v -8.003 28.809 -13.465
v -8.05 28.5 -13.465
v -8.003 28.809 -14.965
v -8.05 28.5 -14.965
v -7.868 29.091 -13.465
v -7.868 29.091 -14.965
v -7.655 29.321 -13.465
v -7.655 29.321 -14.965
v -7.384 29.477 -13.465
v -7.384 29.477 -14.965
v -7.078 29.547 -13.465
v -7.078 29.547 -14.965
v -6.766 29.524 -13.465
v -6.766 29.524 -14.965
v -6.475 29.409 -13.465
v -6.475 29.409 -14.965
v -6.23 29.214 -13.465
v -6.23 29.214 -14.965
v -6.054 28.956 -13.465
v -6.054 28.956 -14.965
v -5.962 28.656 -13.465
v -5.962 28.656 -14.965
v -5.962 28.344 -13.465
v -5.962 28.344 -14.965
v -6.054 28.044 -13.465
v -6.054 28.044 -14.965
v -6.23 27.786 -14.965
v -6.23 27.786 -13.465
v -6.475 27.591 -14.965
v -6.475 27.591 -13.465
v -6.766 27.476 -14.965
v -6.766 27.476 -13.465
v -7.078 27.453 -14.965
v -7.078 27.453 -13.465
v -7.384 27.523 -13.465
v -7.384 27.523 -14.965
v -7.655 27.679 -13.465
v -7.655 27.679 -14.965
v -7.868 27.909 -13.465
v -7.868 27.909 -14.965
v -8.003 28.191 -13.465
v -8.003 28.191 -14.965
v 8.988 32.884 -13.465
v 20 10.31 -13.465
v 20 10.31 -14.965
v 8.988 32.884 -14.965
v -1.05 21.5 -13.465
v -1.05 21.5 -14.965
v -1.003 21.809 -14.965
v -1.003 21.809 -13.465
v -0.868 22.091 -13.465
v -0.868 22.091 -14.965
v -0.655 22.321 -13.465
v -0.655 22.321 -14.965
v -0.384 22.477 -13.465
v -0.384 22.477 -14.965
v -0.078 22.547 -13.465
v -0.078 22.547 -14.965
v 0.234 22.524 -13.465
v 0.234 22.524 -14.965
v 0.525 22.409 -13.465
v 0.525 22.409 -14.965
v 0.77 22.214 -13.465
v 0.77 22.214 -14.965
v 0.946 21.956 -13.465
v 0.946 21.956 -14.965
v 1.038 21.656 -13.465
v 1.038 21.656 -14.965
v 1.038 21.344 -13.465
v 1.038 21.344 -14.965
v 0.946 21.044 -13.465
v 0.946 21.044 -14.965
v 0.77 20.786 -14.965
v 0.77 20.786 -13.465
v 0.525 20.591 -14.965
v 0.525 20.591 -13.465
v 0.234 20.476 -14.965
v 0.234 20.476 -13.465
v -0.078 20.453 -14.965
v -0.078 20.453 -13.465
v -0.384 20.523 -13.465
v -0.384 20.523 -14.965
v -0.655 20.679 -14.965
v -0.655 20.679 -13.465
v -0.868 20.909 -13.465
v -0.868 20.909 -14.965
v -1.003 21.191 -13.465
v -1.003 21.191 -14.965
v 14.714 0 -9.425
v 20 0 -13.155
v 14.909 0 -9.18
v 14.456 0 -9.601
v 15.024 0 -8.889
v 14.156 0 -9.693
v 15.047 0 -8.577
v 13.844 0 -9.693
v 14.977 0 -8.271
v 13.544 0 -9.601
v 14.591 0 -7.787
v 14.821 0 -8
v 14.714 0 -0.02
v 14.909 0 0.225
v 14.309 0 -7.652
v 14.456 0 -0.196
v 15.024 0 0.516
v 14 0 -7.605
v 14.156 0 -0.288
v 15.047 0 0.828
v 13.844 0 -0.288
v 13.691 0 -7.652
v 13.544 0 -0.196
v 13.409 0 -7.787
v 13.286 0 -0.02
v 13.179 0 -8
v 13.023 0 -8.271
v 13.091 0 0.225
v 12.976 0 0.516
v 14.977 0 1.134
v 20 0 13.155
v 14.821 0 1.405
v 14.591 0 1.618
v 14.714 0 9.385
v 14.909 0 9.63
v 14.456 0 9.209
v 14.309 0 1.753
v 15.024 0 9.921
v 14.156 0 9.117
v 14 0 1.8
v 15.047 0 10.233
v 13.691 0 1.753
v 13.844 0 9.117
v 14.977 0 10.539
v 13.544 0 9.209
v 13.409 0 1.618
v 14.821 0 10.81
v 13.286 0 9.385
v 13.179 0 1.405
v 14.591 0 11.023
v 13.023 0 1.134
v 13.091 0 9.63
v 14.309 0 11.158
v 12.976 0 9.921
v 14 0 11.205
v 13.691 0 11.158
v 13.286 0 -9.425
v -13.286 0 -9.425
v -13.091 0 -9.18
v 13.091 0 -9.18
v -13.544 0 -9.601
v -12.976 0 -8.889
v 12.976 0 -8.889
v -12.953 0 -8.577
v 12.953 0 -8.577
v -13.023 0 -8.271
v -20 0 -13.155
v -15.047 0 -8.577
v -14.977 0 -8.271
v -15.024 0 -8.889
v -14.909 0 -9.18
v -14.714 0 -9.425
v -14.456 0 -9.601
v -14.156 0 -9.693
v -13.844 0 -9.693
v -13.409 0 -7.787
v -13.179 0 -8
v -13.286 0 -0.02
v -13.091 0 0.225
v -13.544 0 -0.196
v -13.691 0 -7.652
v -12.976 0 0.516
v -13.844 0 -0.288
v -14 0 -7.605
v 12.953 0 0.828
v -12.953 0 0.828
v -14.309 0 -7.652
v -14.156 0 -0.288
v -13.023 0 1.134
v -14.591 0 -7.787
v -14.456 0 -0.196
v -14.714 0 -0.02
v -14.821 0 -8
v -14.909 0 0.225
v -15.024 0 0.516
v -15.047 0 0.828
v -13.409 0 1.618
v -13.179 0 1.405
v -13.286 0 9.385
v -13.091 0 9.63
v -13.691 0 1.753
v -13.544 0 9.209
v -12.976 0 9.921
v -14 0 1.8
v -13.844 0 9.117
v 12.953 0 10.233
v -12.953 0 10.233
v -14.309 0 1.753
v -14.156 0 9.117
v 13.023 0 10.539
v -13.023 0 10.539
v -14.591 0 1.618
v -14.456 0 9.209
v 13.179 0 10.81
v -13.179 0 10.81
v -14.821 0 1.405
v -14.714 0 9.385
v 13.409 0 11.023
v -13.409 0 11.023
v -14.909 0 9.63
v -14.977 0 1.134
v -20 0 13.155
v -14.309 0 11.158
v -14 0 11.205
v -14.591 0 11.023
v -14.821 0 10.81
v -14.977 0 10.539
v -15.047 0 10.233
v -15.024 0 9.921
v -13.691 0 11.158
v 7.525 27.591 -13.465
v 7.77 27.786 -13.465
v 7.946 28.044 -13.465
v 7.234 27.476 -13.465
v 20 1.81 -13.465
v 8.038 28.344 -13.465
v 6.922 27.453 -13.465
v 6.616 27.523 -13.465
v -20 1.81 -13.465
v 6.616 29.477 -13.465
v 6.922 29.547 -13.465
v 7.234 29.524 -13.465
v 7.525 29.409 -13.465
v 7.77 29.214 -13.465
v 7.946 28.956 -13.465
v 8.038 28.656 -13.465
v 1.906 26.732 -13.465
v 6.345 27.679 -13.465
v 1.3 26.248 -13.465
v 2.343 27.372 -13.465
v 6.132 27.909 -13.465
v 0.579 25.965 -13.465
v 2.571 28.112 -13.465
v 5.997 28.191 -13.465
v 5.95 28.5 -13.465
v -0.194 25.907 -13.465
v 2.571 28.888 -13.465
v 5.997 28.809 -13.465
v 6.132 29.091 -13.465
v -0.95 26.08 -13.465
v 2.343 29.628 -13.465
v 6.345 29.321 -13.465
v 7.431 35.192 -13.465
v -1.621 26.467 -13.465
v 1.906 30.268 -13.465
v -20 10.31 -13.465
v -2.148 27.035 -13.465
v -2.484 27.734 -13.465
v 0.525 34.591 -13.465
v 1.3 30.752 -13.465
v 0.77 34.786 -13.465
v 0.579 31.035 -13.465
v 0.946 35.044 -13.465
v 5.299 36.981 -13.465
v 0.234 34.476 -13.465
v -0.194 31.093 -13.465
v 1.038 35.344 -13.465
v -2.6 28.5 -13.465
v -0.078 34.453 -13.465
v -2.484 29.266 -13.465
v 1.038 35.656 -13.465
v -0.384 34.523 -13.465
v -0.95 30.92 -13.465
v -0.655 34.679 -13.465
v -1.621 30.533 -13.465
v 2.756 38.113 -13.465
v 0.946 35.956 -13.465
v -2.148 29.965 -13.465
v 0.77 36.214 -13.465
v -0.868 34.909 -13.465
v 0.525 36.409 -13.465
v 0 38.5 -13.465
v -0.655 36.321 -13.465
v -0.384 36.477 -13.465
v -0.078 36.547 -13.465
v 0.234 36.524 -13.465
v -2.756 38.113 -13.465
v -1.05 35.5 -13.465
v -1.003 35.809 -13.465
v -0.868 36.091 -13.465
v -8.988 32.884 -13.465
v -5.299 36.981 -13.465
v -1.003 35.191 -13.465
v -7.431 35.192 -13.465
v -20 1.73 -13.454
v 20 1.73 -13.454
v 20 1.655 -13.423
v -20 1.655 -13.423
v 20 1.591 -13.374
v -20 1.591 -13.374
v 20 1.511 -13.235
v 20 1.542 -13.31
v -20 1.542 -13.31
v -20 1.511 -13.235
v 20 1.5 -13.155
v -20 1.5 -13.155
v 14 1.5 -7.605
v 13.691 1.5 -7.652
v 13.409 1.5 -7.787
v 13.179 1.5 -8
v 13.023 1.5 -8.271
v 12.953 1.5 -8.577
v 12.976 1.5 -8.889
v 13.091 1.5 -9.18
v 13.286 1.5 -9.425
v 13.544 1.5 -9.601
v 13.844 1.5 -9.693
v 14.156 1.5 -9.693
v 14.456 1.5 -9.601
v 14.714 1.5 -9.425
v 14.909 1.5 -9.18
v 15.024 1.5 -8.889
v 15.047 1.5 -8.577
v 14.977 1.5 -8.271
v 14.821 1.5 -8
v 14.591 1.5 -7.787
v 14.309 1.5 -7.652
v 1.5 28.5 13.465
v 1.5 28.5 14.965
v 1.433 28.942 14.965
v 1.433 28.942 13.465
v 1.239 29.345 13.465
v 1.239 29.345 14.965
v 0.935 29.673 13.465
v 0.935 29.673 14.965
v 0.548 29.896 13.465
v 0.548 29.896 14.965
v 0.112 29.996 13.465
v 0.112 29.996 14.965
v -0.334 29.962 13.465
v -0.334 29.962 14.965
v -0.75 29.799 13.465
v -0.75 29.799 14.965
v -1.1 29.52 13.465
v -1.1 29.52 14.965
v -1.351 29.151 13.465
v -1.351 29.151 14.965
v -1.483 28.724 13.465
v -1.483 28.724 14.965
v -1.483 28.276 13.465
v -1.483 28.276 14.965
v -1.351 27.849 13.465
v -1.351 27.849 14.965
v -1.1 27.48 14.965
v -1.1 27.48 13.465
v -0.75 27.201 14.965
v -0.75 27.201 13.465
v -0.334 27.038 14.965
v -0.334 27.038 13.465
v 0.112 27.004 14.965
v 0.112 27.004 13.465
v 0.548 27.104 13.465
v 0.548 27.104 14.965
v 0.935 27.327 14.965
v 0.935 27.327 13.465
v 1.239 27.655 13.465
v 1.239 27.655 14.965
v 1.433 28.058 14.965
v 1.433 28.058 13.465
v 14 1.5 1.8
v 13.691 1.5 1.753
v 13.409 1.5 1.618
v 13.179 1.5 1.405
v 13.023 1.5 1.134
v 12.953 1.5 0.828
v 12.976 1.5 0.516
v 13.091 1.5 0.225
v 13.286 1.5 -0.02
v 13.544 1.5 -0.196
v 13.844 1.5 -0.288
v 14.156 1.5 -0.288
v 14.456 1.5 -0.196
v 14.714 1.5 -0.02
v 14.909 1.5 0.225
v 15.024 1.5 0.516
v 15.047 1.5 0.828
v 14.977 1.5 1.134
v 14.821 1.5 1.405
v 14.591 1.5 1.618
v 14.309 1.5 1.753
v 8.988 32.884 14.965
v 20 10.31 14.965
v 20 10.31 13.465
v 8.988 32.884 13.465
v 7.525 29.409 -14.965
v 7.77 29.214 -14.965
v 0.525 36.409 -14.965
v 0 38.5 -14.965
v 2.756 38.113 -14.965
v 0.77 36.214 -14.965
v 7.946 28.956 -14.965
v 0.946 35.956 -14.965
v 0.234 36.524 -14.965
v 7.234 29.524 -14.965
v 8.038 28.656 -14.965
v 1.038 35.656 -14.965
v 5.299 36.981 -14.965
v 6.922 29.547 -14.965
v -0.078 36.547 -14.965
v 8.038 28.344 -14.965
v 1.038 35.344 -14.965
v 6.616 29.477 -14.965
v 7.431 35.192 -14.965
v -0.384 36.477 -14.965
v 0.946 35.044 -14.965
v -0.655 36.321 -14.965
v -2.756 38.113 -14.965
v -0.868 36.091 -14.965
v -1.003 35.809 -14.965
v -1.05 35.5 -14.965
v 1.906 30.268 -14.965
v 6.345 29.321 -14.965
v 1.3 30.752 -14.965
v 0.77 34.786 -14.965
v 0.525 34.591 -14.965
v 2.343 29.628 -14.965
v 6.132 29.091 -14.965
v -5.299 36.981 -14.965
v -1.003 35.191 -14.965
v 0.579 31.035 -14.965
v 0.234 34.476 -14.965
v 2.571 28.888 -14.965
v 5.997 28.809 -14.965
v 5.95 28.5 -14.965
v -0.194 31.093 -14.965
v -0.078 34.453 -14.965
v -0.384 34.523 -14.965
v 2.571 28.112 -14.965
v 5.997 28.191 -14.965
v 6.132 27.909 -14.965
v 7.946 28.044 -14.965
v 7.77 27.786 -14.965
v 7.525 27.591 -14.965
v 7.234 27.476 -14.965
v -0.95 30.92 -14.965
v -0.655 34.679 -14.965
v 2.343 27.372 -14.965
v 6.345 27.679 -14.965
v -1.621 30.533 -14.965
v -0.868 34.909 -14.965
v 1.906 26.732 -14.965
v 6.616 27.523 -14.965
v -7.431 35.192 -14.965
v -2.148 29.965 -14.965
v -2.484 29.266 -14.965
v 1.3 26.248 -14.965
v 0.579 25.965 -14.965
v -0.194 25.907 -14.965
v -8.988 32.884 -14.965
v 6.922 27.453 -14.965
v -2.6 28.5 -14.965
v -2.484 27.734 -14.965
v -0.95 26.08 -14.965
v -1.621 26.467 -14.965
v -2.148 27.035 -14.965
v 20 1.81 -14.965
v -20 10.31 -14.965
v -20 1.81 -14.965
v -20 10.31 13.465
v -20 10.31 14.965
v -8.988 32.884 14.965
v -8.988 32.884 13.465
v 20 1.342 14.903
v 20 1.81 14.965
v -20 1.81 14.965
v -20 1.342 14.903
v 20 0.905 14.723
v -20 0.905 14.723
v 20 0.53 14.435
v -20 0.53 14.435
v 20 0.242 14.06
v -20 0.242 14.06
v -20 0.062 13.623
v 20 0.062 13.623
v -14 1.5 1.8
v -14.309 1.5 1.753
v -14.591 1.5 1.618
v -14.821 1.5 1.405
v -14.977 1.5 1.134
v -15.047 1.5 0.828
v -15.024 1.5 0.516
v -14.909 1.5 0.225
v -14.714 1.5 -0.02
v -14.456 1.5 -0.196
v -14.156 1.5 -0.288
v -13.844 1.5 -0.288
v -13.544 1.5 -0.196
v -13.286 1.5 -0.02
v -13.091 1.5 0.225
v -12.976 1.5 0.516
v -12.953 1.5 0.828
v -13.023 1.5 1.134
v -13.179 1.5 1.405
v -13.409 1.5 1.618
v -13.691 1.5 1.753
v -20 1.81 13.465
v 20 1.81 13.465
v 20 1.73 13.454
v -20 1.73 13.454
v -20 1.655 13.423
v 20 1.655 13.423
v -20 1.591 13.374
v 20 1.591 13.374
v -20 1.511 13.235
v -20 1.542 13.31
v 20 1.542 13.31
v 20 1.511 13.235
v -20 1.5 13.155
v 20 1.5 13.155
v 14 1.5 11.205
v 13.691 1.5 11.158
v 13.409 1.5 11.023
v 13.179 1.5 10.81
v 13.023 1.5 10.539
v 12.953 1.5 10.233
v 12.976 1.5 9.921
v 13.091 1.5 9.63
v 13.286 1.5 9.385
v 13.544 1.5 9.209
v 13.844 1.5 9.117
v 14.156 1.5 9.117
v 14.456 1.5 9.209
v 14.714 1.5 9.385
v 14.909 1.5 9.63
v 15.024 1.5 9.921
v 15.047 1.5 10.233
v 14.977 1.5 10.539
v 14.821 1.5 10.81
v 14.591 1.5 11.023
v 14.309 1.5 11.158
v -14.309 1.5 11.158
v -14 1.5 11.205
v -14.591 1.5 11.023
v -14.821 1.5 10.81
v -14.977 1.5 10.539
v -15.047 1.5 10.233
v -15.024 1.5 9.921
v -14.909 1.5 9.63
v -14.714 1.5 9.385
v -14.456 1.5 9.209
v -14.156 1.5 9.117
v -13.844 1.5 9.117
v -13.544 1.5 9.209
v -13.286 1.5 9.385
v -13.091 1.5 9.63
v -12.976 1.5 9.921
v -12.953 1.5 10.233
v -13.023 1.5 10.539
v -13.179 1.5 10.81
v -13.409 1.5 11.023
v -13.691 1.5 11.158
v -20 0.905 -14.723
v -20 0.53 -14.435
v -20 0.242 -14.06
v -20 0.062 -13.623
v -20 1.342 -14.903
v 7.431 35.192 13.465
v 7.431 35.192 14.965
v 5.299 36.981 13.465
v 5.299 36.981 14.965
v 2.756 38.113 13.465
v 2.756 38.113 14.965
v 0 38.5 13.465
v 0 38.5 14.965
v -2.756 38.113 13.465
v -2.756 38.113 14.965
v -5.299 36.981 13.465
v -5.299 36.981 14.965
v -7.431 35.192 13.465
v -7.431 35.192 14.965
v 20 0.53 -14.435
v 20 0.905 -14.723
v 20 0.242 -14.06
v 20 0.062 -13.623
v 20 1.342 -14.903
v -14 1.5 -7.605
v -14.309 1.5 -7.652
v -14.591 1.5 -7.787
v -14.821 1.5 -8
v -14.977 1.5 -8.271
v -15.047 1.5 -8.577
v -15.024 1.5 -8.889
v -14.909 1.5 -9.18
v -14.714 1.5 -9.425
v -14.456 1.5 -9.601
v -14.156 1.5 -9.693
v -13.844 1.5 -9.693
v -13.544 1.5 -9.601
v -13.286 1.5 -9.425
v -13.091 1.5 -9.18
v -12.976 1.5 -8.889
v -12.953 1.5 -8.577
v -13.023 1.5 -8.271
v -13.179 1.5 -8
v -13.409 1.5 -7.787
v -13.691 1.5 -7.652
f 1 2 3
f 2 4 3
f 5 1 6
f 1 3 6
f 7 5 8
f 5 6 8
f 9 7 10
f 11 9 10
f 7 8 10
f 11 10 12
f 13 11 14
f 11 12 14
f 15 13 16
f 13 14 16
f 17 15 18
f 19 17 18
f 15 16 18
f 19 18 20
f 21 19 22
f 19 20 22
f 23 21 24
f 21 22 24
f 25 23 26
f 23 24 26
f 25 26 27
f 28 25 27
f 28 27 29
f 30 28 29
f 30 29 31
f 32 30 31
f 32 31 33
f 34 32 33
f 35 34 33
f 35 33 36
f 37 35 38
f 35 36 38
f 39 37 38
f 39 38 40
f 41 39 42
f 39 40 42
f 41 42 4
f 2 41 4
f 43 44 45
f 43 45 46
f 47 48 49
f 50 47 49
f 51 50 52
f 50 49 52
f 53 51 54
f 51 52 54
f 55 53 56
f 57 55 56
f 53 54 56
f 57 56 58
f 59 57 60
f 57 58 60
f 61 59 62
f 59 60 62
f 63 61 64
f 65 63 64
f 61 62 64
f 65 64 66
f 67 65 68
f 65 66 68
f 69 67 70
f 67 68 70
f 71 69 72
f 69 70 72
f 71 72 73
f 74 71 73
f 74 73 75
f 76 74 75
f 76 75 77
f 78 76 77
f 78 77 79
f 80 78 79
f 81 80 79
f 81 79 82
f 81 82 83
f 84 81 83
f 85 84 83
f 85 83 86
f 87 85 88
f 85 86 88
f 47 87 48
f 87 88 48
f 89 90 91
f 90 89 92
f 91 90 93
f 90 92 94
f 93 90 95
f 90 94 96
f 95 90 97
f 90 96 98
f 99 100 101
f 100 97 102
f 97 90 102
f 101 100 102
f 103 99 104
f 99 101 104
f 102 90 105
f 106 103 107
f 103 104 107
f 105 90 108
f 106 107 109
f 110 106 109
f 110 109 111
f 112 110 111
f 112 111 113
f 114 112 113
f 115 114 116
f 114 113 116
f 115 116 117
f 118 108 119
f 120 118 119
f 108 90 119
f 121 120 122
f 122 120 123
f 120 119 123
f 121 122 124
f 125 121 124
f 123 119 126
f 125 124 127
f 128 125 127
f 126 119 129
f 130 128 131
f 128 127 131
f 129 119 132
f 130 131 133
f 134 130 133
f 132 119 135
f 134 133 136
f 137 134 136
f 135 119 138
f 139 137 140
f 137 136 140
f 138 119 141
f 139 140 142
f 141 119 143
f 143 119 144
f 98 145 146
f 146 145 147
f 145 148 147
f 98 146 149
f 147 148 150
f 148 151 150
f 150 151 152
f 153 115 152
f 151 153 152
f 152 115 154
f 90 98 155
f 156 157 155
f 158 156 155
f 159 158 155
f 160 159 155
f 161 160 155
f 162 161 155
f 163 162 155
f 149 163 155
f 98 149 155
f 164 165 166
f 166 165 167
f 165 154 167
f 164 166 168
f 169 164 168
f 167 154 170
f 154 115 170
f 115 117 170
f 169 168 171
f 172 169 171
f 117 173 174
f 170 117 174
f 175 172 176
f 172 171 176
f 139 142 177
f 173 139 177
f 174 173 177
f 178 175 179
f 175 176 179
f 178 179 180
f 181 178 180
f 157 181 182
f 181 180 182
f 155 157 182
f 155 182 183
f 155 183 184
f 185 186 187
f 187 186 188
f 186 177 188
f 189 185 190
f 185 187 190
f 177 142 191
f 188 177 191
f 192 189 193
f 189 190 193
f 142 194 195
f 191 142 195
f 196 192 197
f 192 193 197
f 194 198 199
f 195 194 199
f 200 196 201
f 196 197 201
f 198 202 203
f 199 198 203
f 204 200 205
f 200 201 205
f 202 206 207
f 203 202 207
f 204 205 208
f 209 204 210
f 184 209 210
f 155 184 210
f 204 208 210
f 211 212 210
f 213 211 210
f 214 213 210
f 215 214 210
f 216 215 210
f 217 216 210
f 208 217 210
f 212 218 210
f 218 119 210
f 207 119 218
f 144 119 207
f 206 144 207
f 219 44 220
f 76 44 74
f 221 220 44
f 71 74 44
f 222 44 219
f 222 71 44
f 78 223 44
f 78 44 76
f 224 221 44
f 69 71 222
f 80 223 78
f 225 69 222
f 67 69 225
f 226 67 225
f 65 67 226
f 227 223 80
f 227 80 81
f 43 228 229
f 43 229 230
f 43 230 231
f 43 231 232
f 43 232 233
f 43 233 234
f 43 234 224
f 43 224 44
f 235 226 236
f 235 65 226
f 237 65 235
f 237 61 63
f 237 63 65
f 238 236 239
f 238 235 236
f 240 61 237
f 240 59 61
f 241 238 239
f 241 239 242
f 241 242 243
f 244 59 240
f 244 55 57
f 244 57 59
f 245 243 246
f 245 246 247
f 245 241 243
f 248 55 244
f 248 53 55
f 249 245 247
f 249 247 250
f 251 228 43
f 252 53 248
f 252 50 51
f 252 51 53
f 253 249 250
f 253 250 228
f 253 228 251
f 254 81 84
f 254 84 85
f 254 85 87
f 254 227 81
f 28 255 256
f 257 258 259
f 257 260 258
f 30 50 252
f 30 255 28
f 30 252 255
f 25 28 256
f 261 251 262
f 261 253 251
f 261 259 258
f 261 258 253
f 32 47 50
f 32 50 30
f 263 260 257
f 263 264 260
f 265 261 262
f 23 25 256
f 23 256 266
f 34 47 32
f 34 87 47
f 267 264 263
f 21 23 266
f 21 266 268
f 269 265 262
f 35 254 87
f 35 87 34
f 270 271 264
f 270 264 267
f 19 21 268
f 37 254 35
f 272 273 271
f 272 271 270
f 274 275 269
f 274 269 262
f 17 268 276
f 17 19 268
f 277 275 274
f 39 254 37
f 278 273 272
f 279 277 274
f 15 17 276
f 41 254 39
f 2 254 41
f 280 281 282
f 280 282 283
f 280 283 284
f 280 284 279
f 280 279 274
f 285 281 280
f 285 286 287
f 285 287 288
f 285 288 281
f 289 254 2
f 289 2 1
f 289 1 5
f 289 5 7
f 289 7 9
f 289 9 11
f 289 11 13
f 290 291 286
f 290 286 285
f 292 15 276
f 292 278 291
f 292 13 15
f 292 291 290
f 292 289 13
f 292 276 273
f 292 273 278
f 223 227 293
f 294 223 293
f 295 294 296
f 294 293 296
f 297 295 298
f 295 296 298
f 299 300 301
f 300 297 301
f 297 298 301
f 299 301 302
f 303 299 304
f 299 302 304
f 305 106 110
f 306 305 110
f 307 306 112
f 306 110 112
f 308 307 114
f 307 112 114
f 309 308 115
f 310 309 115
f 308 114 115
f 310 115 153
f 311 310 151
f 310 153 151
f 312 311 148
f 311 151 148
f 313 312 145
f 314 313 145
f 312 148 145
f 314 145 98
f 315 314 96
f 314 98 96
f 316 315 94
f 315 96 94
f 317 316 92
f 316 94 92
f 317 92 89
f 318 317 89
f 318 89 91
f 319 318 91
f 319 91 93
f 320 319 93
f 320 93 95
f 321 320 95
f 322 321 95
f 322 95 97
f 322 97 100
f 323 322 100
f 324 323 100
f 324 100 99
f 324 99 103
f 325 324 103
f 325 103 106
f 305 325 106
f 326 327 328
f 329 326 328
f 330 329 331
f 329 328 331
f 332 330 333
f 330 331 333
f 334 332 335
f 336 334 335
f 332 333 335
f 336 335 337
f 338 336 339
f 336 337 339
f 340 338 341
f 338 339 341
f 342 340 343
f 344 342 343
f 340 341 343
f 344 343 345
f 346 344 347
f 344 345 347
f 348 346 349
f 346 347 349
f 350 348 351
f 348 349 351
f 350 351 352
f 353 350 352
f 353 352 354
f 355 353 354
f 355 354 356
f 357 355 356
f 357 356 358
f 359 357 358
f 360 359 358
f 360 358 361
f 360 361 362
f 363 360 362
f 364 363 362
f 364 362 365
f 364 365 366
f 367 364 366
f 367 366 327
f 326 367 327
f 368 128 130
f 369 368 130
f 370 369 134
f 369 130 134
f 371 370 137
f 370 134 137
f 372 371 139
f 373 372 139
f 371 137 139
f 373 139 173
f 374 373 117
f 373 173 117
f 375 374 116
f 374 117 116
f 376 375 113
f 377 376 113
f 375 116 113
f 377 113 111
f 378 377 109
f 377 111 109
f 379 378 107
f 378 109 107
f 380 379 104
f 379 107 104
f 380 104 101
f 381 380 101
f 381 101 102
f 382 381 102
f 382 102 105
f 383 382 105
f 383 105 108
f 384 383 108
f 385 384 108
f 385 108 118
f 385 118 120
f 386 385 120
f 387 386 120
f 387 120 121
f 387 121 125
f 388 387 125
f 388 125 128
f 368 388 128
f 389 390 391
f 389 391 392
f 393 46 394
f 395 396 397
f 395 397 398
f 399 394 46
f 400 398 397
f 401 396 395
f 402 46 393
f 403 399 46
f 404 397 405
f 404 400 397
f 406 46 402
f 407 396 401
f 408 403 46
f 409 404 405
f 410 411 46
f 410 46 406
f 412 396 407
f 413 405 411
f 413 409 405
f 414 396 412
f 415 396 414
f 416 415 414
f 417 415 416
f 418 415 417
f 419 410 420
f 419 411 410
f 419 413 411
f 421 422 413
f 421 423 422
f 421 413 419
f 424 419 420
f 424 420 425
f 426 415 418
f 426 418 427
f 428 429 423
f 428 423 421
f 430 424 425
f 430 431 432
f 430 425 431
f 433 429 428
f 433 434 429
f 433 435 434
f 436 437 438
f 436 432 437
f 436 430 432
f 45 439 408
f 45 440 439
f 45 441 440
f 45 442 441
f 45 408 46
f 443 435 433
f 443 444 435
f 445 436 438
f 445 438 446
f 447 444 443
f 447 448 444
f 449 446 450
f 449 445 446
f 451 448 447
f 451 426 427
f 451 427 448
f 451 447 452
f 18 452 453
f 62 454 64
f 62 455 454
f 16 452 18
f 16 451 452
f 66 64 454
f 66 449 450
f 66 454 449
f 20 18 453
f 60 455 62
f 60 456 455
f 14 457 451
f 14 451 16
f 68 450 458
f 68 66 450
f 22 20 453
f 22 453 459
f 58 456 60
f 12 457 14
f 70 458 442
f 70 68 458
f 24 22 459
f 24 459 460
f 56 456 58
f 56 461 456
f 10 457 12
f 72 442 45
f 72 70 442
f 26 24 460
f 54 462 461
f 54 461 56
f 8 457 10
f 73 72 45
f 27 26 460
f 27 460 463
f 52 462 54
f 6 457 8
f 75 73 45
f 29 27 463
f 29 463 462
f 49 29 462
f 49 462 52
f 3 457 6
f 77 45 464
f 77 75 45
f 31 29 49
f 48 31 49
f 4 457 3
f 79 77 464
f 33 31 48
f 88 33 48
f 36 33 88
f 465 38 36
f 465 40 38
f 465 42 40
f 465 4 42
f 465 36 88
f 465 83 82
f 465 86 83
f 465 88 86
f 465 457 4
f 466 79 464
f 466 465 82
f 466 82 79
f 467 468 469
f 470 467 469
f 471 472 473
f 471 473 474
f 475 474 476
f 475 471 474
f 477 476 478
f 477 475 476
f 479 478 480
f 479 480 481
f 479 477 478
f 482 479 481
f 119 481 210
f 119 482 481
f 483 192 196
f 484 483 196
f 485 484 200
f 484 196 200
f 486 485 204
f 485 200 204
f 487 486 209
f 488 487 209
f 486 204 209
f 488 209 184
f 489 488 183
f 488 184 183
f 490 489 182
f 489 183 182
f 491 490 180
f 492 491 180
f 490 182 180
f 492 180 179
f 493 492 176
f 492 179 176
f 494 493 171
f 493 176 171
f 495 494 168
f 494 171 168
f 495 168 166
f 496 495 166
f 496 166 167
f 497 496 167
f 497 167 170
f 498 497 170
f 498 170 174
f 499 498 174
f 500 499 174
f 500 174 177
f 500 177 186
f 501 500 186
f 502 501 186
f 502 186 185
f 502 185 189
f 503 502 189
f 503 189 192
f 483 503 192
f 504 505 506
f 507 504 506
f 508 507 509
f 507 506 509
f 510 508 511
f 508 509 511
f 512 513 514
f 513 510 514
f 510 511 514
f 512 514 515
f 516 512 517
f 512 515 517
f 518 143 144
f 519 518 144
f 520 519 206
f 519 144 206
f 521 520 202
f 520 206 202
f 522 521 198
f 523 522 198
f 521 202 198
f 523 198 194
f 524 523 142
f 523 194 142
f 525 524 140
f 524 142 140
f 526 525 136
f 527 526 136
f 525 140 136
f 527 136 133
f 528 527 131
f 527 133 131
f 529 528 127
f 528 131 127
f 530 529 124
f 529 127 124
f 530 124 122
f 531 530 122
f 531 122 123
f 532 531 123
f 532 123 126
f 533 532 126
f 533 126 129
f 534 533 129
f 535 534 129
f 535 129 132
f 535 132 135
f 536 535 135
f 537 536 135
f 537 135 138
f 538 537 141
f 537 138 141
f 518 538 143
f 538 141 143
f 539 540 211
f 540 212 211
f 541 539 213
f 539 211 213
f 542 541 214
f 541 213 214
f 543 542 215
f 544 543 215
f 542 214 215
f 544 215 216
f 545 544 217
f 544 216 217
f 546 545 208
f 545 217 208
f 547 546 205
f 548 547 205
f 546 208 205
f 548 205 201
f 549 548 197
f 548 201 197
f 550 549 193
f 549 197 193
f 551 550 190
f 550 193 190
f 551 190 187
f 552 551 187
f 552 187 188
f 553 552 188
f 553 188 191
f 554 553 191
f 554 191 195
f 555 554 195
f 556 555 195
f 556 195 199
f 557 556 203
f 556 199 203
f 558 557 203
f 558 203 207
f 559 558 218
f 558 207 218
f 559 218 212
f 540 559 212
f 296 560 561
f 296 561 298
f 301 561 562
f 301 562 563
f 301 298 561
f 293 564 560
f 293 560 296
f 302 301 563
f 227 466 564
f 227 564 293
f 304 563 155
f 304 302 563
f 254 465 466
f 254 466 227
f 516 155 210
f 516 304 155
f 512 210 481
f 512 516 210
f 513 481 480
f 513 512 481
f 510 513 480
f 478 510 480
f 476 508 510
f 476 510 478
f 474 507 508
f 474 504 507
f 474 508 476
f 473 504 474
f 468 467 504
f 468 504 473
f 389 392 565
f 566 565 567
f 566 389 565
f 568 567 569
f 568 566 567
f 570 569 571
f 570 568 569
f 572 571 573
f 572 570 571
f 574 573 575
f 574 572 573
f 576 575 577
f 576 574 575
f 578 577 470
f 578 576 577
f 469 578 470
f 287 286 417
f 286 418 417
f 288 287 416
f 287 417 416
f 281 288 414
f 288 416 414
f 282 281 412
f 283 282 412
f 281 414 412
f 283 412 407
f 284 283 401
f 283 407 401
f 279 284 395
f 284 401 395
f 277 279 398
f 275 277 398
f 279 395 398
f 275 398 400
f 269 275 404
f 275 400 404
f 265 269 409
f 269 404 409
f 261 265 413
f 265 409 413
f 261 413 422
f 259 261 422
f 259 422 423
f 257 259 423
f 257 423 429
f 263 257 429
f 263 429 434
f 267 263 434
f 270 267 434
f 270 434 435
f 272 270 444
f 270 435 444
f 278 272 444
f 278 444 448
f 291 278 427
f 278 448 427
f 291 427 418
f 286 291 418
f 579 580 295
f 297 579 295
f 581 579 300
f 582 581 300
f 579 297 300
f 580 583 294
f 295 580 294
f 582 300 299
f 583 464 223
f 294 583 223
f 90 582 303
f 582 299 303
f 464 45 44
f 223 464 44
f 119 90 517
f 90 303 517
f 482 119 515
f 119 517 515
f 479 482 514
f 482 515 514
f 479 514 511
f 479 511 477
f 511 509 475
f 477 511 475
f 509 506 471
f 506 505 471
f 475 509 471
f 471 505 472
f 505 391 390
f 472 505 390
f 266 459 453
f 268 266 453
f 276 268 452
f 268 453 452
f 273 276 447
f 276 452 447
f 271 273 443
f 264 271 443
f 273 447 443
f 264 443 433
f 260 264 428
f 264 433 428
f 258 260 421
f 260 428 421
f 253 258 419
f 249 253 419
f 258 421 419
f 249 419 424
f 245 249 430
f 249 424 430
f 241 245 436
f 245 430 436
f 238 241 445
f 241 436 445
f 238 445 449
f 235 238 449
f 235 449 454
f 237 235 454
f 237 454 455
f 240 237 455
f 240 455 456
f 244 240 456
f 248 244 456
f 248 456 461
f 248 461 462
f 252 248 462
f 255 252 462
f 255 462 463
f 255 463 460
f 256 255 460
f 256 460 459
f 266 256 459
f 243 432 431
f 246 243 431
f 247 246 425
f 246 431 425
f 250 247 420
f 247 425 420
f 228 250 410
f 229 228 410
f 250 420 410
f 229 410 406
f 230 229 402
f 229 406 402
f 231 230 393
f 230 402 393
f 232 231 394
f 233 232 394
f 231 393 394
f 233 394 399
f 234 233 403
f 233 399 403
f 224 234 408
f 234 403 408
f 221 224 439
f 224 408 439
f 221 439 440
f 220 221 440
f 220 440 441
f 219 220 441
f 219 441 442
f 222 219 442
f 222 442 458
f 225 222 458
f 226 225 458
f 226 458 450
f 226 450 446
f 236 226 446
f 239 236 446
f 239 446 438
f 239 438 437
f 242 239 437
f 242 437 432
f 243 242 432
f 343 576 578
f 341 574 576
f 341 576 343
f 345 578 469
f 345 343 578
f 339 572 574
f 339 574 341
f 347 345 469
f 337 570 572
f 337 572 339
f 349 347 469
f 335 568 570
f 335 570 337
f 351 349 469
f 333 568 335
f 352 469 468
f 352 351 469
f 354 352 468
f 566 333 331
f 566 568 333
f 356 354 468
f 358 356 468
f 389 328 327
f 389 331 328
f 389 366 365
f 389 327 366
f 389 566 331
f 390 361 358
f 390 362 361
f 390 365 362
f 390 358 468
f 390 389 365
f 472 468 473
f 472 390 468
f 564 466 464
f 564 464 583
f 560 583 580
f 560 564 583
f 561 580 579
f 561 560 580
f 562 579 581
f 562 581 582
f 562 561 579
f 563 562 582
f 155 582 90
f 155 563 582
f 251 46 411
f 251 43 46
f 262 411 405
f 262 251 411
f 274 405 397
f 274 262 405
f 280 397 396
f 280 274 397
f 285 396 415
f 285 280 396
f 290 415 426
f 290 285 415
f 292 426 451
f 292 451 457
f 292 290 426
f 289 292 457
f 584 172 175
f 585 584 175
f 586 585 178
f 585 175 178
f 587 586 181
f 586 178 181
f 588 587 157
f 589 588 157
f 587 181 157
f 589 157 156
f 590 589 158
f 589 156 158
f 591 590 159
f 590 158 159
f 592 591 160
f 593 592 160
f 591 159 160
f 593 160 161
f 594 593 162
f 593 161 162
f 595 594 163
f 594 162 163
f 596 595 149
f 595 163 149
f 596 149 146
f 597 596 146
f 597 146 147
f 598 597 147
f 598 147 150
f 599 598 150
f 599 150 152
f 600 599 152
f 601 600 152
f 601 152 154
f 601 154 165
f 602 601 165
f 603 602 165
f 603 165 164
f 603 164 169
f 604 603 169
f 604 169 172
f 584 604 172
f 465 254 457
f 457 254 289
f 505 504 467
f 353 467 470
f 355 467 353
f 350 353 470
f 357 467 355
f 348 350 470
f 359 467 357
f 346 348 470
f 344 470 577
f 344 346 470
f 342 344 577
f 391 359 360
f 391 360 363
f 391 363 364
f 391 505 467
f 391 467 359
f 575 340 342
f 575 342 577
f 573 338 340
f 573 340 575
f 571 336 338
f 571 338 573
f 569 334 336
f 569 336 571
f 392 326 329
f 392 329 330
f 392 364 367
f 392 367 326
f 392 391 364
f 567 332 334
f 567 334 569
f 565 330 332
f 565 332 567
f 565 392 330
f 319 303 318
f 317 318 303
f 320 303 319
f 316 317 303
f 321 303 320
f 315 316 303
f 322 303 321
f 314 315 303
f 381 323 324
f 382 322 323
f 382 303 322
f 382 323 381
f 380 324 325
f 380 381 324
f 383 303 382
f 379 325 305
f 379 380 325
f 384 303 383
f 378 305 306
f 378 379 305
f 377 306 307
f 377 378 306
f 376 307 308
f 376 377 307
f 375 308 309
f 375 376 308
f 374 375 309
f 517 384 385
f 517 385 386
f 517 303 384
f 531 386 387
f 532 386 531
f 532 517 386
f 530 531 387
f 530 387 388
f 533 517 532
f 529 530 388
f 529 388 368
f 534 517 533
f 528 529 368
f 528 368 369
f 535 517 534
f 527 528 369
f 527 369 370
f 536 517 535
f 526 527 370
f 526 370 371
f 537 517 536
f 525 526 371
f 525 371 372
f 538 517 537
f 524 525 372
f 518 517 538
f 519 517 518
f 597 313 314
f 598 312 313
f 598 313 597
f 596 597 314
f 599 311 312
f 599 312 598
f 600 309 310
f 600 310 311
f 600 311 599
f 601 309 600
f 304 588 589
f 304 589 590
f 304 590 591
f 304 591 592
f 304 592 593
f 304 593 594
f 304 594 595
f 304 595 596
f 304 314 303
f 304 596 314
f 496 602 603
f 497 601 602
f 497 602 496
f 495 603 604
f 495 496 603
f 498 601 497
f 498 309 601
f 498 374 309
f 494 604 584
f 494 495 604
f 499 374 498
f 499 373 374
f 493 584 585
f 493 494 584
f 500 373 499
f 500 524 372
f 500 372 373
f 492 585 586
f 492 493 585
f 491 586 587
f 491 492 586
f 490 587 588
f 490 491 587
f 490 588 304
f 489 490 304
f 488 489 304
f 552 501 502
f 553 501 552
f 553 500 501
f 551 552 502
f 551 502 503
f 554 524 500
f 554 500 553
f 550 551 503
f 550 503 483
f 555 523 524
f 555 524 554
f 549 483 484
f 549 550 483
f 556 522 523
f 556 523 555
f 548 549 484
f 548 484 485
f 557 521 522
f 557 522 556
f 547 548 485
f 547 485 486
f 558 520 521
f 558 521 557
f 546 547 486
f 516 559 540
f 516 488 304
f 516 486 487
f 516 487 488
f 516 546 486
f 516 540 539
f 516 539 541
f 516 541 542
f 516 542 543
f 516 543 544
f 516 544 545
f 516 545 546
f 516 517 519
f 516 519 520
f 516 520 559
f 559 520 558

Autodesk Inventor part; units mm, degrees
ref_plane "YZ Plane" through (0, 0, 0) normal (1, 0, 0) x (0, 1, 0)
ref_plane "XZ Plane" through (0, 0, 0) normal (0, 1, 0) x (-1, 0, 0)
ref_plane "XY Plane" through (0, 0, 0) normal (0, 0, 1) x (1, 0, 0)
sketch "Sketch1" plane through (0, 0, 0) normal (0, 1, 0) x (-1, 0, 0)
  line L0 (20, 14.965) -> (-20, 14.965)
  line L1 (-20, 14.965) -> (-20, -14.965)
  line L2 (-20, -14.965) -> (20, -14.965)
  line L3 (20, -14.965) -> (20, 14.965)
  point P0 (0, 0)
  dimension "d0" = 29.93
  dimension "d1" = 40
  dimension "d2" = 20
  dimension "d3" = 14.965
extrude "Plate1" add sketch "Sketch1" along normal blind 1.5
sketch "Sketch2" plane through (-20, 0, -13.465) normal (0, 0, -1) x (-1, 0, 0)
  line L0 (-40, 0) -> (0, 0)
  line L1 (0, 0) -> (0, 38.5)
  line L2 (0, 38.5) -> (-40, 38.5)
  line L3 (-40, 38.5) -> (-40, 0)
edge flange "Flange1" height 38.5 angle 90 thickness 1.5 bend radius 0.31 thickness toward (0, 0, -1) relief tear relief width 1.5 relief depth 0.75 corner gap 0.31 corner form 0 edges at (0, 1.5, -14.965) (0, 1.5, 14.965) wall of the first edge with corners at (20, 0, -13.465) (-20, 0, -13.465) (-20, 38.5, -13.465) (20, 38.5, -13.465)
bend "Bend1"
corner "Corner1"
sketch "Sketch3" plane through (-20, 38.5, 14.965) normal (0, 0, 1) x (1, 0, 0)
  line L0 (0, 0) -> (40, 0) projected
  line L1 (0, -36.69) -> (0, 0) projected
  circle A0 centre (20, -10) radius 10
  line L2 (0, -28.19) -> (40, -28.19)
  line L3 (40, -28.19) -> (40, -38.19)
  line L4 (40, -38.19) -> (0, -38.19)
  line L5 (0, -38.19) -> (0, -28.19)
  line L6 (40, -28.19) -> (28.9876, -5.6156)
  line L7 (0, -28.19) -> (11.0124, -5.6156)
  line L8 (0, 0) -> (40, 0)
  line L9 (40, 0) -> (40, -35)
  line L10 (40, -35) -> (0, -35)
  line L11 (0, -35) -> (0, 0)
  point P0 (20, -38.5)
  point P1 (20, 0)
  point P2 (0, -28.19)
  point P3 (0, -35)
  point P4 (30, -10)
  dimension "d15" = 10
  dimension "d16" = 0
  dimension "d17" = 20
  dimension "d18" = 18.19
  dimension "d19" = 0
  dimension "d20" = 40
  dimension "d21" = 10
  dimension "d22" = 35
extrude "Extrusion1" cut sketch "Sketch3" against normal blind 35 contours L0 A0 L7 L1 | L0 L9 L6 A0
sketch "Sketch4" plane through (20, 1.81, -14.965) normal (0, 0, -1) x (-1, 0, 0)
  arc A0 (28.9876, 31.0744) -> (11.0124, 31.0744) centre (20, 26.69) ccw projected
  circle A1 centre (20, 26.69) radius 2.6
  circle A2 centre (13, 26.69) radius 1.05
  circle A3 centre (27, 26.69) radius 1.05
  circle A4 centre (20, 33.69) radius 1.05
  circle A5 centre (20, 19.69) radius 1.05
  point P0 (20, -1.81)
  dimension "d25" = 5.2
  dimension "d26" = 0
  dimension "d27" = 7
  dimension "d28" = 2.1
  dimension "d29" = 7
  dimension "d30" = 0
  dimension "d31" = 2.1
  dimension "d32" = 0
  dimension "d33" = 7
  dimension "d34" = 2.1
  dimension "d35" = 7
  dimension "d36" = 0
  dimension "d37" = 2.1
extrude "Extrusion2" cut sketch "Sketch4" against normal blind 1.5
sketch "Sketch5" plane through (-20, 1.81, 14.965) normal (0, 0, 1) x (1, 0, 0)
  arc A0 (28.9876, 31.0744) -> (11.0124, 31.0744) centre (20, 26.69) ccw projected
  circle A1 centre (20, 26.69) radius 1.5
  point P0 (20, -1.81)
  dimension "d40" = 3
extrude "Extrusion3" cut sketch "Sketch5" against normal blind 1.5
sketch "Sketch6" plane through (0, 1.5, 0) normal (0, 1, 0) x (1, 0, 0)
  circle A0 centre (-14, -10.155) radius 1.05 projected
  circle A1 centre (-14, -0.75) radius 1.05 projected
  circle A2 centre (-14, 8.655) radius 1.05 projected
  circle A3 centre (14, -10.155) radius 1.05 projected
  circle A4 centre (14, -0.75) radius 1.05 projected
  circle A5 centre (14, 8.655) radius 1.05 projected
  point P0 (0, 0)
hole "Hole1" at (14, 1.5, -8.655) at (14, 1.5, 0.75) at (14, 1.5, 10.155) at (-14, 1.5, 10.155) at (-14, 1.5, 0.75) at (-14, 1.5, -8.655) direction (0, -1, 0) diameter 2.1 depth 1.5
equation "\"d48\" = Thickness"
equation "\"d4\" = Thickness"
equation "\"d5\" = BendReliefWidth"
equation "\"d6\" = BendReliefDepth"
equation "\"d7\" = MinimumRemnant"
equation "\"d8\" = TransitionRadius"
equation "\"d11\" = BendRadius"
equation "\"d12\" = CornerReliefSize"
equation "\"d13\" = GapSize"
equation "\"d14\" = JacobiRadiusSize"
equation "\"BendReliefWidth\" = Thickness"
equation "\"BendReliefDepth\" = 0.5 * Thickness"
equation "\"CornerReliefSize\" = 4 * Thickness"
equation "\"MinimumRemnant\" = 2 * Thickness"
equation "\"TransitionRadius\" = BendRadius"
equation "\"JacobiRadiusSize\" = BendRadius"
equation "\"GapSize\" = Thickness"
equation "\"Thickness\" = 1.5"
equation "\"BendRadius\" = 0.31"
properties part number "partpart" material "Aluminum 6061-AHC"
